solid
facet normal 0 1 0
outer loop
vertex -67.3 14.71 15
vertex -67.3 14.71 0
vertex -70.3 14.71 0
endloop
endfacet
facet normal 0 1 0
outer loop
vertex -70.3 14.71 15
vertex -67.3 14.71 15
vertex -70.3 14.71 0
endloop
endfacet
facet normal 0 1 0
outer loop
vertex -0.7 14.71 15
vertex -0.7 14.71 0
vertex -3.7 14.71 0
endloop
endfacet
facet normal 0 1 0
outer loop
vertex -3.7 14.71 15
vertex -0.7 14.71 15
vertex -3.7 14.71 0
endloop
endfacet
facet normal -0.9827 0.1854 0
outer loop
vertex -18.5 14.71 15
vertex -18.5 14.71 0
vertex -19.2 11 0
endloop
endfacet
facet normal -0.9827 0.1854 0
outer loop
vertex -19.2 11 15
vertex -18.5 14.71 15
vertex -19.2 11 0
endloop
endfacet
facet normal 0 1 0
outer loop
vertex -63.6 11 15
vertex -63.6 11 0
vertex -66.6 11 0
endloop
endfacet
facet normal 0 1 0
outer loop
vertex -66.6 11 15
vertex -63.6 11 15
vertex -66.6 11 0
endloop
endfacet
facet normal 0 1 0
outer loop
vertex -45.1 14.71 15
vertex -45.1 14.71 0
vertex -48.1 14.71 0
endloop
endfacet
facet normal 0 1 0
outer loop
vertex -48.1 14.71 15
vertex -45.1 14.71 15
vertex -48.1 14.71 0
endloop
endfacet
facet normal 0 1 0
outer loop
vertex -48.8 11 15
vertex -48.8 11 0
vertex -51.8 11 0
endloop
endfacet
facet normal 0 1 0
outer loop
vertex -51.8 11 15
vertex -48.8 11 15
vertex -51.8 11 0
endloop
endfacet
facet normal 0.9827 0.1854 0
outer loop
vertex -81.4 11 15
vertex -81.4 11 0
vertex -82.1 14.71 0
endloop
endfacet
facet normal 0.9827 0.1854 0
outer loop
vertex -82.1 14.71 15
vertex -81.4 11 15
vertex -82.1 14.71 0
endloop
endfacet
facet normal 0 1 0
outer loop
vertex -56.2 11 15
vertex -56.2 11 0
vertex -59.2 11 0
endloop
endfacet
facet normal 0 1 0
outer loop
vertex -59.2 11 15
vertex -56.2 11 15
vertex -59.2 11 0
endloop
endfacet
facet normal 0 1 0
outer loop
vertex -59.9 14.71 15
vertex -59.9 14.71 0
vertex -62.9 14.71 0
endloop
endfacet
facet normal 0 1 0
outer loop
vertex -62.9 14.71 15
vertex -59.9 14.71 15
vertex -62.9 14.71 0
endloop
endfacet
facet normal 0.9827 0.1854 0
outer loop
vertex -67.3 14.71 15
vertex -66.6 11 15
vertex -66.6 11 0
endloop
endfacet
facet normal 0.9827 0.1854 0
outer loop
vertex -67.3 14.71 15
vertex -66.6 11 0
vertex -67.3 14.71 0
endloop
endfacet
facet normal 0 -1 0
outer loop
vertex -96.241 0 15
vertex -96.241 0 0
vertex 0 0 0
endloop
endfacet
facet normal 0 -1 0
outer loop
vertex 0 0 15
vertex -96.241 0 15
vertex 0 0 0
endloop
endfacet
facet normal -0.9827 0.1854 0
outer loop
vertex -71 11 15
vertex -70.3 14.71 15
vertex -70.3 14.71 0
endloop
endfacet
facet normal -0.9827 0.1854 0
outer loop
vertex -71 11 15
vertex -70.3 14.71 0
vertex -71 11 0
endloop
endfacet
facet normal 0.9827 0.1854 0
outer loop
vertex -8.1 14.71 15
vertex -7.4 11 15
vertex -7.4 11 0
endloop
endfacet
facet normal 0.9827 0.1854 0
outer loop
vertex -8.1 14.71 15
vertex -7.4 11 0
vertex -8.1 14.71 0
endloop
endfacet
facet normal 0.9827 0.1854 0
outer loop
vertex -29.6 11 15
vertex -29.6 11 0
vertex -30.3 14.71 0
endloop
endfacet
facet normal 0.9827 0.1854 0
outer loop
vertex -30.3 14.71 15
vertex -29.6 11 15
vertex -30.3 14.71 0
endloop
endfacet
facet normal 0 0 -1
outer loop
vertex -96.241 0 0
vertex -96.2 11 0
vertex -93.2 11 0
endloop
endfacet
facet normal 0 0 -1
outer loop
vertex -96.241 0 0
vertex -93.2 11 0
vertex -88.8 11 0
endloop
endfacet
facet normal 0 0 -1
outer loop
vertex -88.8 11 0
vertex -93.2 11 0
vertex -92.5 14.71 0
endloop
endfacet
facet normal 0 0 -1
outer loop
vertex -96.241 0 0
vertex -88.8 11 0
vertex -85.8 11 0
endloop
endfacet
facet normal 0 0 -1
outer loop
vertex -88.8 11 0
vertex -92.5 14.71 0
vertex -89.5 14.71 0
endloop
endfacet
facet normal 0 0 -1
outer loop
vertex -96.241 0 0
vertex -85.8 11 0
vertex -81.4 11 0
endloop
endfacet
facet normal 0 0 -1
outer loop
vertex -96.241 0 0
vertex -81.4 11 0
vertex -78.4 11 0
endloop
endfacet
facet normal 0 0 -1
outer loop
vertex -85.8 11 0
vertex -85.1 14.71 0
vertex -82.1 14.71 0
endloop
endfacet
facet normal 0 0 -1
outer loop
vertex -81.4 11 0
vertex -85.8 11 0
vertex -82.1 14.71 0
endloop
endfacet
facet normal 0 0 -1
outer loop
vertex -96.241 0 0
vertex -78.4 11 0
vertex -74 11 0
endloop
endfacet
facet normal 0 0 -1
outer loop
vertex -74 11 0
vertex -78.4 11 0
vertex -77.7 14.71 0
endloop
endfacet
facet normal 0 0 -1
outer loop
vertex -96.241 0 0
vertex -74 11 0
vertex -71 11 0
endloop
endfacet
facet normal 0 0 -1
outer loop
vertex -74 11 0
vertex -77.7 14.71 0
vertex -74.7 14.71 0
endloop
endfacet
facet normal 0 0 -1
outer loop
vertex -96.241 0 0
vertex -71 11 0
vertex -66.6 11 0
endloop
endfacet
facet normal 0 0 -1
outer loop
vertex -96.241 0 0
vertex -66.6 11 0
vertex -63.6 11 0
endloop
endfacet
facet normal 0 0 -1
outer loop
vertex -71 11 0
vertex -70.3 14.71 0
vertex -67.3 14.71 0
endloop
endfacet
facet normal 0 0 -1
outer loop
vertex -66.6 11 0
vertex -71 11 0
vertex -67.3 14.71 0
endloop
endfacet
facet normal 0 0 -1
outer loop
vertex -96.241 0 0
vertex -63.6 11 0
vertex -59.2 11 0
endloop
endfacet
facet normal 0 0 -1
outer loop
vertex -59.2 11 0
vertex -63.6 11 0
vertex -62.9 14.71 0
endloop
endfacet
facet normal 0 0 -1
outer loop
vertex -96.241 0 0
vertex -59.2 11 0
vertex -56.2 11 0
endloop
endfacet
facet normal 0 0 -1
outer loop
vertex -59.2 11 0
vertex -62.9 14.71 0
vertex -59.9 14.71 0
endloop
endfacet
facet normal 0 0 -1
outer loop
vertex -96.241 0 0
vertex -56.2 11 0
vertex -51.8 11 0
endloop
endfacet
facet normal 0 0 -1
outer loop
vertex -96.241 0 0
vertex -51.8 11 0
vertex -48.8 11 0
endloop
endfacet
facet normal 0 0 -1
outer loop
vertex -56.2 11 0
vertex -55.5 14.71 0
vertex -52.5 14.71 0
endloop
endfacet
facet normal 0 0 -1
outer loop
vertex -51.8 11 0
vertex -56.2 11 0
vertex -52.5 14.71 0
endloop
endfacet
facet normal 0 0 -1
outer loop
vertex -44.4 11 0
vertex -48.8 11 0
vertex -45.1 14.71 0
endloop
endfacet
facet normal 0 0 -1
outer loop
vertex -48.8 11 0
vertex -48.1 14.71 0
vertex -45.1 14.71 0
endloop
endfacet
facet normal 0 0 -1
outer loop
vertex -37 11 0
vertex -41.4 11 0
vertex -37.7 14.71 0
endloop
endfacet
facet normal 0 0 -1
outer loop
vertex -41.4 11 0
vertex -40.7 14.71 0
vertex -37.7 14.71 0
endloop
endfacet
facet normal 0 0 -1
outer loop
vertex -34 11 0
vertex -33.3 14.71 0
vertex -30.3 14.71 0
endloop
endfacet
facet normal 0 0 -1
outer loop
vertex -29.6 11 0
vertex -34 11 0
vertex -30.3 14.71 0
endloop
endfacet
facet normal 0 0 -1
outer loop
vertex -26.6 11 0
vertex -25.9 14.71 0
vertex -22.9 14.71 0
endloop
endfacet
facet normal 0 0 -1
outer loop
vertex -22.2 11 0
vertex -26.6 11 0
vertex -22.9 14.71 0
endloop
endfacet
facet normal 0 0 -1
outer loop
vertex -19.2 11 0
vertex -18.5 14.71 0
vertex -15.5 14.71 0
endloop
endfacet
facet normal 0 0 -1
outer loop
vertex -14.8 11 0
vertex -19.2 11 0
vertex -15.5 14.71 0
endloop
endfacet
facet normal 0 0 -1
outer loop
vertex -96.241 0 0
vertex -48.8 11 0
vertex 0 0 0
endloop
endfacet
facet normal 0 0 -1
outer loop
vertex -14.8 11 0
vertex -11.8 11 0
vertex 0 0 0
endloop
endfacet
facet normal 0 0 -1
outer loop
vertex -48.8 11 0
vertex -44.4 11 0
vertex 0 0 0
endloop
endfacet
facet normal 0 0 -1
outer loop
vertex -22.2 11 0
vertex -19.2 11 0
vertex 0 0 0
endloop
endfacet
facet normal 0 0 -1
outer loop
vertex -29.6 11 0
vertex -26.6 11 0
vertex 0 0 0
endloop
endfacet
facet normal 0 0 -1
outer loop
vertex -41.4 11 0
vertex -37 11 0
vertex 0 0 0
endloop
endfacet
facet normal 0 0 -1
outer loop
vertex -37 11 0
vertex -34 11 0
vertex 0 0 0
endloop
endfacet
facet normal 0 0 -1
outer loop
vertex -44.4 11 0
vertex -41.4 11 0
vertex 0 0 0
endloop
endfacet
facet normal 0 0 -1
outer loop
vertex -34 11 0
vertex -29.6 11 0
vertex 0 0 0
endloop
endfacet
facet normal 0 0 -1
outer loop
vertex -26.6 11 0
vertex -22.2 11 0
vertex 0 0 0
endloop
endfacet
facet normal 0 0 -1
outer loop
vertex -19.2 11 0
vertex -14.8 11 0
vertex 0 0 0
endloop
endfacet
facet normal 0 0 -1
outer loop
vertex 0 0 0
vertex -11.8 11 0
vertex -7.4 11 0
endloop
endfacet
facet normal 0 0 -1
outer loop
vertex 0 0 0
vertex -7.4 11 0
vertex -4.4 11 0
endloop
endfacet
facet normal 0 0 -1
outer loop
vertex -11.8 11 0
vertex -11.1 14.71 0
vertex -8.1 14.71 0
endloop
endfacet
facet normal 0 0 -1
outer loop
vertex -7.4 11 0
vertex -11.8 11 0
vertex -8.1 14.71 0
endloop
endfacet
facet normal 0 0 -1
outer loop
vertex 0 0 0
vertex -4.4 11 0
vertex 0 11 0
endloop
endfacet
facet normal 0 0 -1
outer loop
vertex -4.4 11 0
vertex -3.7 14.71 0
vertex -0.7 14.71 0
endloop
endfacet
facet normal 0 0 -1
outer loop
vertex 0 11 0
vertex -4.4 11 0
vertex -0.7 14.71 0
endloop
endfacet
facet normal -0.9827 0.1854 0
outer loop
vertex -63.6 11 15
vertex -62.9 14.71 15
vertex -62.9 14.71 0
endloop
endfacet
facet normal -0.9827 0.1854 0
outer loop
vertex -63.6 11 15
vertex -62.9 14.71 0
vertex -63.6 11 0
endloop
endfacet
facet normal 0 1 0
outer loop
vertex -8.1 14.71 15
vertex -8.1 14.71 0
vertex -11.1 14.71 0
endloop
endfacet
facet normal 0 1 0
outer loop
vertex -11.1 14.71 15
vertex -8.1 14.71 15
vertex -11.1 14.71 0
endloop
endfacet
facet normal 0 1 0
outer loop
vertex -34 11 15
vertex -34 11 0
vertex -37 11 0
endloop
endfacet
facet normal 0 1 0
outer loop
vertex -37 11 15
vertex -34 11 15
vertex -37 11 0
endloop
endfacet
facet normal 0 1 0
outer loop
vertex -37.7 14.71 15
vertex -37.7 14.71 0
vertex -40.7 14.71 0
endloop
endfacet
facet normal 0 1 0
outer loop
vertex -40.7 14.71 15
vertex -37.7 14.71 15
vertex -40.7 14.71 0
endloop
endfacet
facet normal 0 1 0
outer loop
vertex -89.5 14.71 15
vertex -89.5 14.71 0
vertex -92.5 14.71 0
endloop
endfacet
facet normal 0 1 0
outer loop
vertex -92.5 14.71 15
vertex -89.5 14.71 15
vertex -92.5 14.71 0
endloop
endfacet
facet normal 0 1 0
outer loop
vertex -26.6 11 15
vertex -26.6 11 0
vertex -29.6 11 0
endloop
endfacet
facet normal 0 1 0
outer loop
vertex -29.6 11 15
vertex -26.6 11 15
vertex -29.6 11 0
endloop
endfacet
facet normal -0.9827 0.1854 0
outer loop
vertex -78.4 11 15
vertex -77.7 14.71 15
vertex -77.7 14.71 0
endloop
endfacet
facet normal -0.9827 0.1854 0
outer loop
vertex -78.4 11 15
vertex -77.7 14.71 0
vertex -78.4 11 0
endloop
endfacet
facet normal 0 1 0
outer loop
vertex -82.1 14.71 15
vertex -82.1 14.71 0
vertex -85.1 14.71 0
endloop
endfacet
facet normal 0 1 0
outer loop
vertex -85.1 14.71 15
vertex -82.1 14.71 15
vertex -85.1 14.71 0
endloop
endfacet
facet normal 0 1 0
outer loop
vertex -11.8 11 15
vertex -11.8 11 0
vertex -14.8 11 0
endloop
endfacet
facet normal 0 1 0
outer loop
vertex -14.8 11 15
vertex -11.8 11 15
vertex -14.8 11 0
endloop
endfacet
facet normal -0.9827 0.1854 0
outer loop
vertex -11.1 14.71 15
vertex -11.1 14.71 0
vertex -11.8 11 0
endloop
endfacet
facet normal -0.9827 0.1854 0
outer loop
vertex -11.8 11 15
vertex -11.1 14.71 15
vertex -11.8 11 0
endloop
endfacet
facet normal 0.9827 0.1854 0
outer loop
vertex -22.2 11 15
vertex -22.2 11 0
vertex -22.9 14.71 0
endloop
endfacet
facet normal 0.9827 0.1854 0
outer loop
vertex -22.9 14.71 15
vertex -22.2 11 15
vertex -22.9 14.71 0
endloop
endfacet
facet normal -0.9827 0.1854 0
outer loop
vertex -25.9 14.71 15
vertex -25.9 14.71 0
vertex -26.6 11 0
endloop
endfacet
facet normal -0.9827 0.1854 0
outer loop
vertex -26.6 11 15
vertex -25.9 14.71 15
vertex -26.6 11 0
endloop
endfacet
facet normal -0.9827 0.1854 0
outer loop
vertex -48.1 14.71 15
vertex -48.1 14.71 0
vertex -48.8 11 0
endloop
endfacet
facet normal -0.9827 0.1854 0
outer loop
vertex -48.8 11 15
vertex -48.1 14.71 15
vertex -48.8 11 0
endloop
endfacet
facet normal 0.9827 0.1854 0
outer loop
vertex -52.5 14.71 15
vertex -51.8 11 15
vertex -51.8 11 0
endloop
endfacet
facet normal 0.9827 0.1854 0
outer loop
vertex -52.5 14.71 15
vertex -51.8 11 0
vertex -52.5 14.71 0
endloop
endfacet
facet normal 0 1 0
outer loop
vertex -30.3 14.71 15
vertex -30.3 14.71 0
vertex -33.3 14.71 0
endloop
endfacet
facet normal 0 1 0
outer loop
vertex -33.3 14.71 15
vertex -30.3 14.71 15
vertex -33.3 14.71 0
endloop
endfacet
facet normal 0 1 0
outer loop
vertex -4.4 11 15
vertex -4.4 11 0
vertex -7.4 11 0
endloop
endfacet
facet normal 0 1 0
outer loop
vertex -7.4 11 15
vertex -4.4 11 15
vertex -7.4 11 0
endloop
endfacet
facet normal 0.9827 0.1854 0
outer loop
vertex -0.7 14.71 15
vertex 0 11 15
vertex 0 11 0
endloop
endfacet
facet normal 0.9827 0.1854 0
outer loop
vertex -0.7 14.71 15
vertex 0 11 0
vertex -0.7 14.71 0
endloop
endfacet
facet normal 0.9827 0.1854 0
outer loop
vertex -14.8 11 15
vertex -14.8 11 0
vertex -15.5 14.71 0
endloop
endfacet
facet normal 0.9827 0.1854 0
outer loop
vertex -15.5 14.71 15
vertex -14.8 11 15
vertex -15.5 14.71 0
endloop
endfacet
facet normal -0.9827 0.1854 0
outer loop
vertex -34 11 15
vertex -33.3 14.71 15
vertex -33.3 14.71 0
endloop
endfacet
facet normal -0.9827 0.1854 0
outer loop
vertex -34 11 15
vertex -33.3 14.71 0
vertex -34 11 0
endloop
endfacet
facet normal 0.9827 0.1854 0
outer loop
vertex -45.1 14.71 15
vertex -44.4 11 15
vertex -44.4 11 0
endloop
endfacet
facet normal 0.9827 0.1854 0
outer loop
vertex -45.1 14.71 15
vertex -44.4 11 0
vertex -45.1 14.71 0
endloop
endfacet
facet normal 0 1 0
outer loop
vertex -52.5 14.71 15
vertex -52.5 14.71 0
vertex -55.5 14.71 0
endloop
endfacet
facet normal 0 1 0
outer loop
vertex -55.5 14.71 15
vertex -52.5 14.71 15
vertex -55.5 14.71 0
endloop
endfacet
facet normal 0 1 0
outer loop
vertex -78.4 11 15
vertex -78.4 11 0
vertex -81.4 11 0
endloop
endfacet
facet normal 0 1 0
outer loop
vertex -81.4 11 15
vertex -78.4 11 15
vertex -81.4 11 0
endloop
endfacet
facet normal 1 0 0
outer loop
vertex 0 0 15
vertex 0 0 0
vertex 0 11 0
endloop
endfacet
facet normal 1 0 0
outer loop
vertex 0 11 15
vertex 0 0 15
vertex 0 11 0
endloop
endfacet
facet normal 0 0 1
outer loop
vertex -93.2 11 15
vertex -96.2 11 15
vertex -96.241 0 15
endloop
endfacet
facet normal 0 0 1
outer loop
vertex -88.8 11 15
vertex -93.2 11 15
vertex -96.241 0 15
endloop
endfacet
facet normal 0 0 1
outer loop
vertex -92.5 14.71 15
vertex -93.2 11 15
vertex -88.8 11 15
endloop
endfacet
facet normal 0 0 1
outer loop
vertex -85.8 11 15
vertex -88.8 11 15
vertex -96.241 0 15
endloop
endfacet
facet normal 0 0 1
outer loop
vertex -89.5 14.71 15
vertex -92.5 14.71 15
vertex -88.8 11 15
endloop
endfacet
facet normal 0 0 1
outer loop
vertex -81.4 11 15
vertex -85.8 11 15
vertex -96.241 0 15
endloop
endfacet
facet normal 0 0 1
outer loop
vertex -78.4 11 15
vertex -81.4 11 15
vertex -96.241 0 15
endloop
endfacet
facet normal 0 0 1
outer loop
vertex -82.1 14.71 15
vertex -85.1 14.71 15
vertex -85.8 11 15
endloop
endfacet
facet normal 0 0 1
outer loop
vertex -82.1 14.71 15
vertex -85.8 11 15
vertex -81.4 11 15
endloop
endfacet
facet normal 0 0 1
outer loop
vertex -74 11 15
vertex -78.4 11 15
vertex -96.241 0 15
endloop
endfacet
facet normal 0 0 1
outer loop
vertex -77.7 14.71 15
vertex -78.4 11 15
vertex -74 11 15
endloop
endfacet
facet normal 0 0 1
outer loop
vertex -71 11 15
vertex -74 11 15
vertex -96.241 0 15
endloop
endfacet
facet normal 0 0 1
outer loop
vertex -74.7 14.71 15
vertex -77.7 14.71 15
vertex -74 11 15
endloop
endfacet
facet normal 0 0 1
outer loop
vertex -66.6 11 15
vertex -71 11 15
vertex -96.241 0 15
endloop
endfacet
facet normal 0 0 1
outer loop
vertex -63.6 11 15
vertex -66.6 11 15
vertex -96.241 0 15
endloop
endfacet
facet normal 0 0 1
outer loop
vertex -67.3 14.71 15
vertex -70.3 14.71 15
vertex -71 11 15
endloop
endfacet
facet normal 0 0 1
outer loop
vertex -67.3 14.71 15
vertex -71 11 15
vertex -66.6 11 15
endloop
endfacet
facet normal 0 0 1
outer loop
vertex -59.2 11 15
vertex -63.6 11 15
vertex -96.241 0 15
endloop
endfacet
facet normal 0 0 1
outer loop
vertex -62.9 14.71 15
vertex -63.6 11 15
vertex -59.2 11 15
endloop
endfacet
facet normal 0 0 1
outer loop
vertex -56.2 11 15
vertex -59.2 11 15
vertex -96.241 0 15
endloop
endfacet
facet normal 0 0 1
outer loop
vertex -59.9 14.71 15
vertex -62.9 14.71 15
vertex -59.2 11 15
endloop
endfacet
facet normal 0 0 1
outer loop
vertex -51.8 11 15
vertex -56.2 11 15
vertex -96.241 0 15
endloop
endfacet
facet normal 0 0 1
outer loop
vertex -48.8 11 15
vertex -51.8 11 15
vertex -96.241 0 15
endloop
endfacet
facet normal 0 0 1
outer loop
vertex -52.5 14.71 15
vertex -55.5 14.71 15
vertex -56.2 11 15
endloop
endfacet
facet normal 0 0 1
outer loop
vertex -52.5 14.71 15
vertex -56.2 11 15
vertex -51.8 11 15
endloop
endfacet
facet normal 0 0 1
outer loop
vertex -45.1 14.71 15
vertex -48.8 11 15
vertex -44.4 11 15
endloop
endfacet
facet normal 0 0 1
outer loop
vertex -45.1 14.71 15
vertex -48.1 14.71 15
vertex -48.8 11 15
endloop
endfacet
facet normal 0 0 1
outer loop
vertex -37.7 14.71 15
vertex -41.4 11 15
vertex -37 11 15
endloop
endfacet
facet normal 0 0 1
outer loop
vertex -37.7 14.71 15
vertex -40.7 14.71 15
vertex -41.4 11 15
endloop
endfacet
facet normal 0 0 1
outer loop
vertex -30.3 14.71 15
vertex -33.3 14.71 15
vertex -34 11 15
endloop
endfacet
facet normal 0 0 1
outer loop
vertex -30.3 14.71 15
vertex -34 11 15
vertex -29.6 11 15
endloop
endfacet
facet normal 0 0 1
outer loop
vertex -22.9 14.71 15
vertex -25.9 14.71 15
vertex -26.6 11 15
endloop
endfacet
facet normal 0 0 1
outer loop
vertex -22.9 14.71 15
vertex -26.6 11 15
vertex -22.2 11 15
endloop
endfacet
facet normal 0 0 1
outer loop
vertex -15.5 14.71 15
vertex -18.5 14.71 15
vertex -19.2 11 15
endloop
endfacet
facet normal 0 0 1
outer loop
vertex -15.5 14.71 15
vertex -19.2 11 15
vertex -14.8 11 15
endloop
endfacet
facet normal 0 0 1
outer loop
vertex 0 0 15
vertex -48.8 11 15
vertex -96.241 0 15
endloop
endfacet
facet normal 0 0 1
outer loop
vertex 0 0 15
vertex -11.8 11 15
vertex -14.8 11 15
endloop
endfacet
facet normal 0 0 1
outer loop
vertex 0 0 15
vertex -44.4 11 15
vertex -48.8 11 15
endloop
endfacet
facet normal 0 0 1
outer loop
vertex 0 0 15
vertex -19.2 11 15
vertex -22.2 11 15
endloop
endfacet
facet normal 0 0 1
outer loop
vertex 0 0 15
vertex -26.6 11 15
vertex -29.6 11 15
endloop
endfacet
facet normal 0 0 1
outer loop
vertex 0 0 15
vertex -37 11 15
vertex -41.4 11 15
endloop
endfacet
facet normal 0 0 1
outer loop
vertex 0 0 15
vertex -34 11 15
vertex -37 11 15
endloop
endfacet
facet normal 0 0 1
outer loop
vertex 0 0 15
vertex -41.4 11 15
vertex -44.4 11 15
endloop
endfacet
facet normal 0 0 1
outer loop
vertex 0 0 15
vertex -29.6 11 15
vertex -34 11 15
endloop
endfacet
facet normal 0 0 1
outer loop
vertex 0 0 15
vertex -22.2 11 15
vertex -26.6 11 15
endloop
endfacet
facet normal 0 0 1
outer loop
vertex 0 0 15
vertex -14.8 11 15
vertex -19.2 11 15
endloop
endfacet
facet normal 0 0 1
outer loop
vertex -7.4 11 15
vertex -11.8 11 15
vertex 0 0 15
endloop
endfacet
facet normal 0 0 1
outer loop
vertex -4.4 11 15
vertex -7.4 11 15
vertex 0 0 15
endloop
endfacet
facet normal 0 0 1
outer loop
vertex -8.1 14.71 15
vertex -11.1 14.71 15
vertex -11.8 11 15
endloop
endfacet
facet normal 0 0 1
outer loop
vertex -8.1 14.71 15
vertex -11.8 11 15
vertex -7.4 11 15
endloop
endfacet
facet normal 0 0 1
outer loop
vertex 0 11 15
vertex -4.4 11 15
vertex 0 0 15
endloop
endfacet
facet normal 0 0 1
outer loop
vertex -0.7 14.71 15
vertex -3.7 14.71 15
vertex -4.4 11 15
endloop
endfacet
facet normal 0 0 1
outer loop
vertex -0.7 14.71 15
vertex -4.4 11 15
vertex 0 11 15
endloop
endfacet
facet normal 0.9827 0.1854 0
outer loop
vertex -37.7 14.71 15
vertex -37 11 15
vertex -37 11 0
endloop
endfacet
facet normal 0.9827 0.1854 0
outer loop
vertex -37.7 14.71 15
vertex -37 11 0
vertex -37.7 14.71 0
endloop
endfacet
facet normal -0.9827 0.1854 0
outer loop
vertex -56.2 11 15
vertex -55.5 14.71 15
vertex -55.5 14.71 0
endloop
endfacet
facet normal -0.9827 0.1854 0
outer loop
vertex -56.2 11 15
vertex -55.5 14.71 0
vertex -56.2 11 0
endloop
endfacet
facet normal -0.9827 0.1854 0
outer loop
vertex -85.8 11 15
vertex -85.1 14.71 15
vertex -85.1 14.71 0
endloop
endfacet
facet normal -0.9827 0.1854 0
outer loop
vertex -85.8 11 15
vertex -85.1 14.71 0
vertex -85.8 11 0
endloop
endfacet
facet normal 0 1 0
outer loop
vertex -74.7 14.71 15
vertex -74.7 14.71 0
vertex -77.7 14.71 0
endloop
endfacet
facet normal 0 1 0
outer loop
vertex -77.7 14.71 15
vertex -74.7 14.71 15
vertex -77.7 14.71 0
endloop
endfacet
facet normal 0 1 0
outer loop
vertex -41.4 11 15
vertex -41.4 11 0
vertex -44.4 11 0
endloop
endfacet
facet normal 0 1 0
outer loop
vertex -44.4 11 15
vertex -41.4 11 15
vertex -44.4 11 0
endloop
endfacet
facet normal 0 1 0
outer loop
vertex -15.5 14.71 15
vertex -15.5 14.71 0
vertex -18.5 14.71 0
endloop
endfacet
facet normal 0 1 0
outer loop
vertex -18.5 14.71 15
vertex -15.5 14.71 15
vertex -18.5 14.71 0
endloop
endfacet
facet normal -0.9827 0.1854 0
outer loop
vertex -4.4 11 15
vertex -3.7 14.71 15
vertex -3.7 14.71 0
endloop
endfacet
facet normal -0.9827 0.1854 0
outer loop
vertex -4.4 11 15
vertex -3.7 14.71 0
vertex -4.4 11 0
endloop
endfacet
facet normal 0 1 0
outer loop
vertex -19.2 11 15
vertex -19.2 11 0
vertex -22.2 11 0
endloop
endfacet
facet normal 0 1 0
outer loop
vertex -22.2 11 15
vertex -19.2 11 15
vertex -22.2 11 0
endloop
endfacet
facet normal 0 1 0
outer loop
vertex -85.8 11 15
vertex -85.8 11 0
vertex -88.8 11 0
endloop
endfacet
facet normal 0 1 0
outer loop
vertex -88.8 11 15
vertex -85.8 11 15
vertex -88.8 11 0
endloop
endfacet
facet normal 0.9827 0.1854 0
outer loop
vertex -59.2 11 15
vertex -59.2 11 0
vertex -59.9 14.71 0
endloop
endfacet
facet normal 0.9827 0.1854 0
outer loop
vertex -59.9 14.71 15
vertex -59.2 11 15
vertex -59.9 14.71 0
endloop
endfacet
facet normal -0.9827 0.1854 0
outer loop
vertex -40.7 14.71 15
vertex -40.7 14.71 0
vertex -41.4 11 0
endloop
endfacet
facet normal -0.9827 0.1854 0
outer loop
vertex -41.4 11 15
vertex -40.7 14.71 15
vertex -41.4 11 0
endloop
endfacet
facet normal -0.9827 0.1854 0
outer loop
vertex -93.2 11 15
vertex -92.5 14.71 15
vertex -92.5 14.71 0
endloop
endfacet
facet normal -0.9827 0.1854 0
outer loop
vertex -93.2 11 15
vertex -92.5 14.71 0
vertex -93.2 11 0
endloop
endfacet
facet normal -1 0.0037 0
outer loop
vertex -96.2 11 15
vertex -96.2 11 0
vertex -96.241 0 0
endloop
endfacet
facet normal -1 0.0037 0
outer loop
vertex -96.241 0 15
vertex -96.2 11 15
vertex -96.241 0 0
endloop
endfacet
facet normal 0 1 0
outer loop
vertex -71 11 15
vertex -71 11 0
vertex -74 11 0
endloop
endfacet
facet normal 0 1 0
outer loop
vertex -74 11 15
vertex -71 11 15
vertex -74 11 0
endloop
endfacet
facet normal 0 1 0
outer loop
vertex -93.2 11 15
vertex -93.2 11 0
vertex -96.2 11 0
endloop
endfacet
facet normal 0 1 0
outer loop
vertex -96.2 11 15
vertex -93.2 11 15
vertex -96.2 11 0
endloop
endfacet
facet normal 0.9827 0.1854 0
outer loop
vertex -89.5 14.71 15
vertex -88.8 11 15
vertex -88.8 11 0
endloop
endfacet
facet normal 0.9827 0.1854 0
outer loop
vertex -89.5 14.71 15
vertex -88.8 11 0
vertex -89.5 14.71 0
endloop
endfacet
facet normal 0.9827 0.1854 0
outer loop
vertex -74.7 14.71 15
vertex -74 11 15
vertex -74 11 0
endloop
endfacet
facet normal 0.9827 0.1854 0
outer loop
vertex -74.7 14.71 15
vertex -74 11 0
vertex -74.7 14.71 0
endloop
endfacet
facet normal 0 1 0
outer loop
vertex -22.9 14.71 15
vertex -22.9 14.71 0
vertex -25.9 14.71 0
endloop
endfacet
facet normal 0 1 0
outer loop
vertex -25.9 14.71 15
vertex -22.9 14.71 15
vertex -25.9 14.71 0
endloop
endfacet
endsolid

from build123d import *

# Parameters (mm, degrees)
EXTRUDE_4_DEPTH = 15


with BuildPart() as part:
    # Эскиз8 → Бобышка-Вытянуть4 (new body)
    with BuildSketch(Plane.XY):
        Polygon((0, 0), (0, 11), (-0.7, 14.71), (-3.7, 14.71), (-4.4, 11), (-7.4, 11), (-8.1, 14.71), (-11.1, 14.71), (-11.8, 11), (-14.8, 11), (-15.5, 14.71), (-18.5, 14.71), (-19.2, 11), (-22.2, 11), (-22.9, 14.71), (-25.9, 14.71), (-26.6, 11), (-29.6, 11), (-30.3, 14.71), (-33.3, 14.71), (-34, 11), (-37, 11), (-37.7, 14.71), (-40.7, 14.71), (-41.4, 11), (-44.4, 11), (-45.1, 14.71), (-48.1, 14.71), (-48.8, 11), (-51.8, 11), (-52.5, 14.71), (-55.5, 14.71), (-56.2, 11), (-59.2, 11), (-59.9, 14.71), (-62.9, 14.71), (-63.6, 11), (-66.6, 11), (-67.3, 14.71), (-70.3, 14.71), (-71, 11), (-74, 11), (-74.7, 14.71), (-77.7, 14.71), (-78.4, 11), (-81.4, 11), (-82.1, 14.71), (-85.1, 14.71), (-85.8, 11), (-88.8, 11), (-89.5, 14.71), (-92.5, 14.71), (-93.2, 11), (-96.2, 11), (-96.240718782, 0), align=None)
    extrude(amount=EXTRUDE_4_DEPTH)


solid = part.part
